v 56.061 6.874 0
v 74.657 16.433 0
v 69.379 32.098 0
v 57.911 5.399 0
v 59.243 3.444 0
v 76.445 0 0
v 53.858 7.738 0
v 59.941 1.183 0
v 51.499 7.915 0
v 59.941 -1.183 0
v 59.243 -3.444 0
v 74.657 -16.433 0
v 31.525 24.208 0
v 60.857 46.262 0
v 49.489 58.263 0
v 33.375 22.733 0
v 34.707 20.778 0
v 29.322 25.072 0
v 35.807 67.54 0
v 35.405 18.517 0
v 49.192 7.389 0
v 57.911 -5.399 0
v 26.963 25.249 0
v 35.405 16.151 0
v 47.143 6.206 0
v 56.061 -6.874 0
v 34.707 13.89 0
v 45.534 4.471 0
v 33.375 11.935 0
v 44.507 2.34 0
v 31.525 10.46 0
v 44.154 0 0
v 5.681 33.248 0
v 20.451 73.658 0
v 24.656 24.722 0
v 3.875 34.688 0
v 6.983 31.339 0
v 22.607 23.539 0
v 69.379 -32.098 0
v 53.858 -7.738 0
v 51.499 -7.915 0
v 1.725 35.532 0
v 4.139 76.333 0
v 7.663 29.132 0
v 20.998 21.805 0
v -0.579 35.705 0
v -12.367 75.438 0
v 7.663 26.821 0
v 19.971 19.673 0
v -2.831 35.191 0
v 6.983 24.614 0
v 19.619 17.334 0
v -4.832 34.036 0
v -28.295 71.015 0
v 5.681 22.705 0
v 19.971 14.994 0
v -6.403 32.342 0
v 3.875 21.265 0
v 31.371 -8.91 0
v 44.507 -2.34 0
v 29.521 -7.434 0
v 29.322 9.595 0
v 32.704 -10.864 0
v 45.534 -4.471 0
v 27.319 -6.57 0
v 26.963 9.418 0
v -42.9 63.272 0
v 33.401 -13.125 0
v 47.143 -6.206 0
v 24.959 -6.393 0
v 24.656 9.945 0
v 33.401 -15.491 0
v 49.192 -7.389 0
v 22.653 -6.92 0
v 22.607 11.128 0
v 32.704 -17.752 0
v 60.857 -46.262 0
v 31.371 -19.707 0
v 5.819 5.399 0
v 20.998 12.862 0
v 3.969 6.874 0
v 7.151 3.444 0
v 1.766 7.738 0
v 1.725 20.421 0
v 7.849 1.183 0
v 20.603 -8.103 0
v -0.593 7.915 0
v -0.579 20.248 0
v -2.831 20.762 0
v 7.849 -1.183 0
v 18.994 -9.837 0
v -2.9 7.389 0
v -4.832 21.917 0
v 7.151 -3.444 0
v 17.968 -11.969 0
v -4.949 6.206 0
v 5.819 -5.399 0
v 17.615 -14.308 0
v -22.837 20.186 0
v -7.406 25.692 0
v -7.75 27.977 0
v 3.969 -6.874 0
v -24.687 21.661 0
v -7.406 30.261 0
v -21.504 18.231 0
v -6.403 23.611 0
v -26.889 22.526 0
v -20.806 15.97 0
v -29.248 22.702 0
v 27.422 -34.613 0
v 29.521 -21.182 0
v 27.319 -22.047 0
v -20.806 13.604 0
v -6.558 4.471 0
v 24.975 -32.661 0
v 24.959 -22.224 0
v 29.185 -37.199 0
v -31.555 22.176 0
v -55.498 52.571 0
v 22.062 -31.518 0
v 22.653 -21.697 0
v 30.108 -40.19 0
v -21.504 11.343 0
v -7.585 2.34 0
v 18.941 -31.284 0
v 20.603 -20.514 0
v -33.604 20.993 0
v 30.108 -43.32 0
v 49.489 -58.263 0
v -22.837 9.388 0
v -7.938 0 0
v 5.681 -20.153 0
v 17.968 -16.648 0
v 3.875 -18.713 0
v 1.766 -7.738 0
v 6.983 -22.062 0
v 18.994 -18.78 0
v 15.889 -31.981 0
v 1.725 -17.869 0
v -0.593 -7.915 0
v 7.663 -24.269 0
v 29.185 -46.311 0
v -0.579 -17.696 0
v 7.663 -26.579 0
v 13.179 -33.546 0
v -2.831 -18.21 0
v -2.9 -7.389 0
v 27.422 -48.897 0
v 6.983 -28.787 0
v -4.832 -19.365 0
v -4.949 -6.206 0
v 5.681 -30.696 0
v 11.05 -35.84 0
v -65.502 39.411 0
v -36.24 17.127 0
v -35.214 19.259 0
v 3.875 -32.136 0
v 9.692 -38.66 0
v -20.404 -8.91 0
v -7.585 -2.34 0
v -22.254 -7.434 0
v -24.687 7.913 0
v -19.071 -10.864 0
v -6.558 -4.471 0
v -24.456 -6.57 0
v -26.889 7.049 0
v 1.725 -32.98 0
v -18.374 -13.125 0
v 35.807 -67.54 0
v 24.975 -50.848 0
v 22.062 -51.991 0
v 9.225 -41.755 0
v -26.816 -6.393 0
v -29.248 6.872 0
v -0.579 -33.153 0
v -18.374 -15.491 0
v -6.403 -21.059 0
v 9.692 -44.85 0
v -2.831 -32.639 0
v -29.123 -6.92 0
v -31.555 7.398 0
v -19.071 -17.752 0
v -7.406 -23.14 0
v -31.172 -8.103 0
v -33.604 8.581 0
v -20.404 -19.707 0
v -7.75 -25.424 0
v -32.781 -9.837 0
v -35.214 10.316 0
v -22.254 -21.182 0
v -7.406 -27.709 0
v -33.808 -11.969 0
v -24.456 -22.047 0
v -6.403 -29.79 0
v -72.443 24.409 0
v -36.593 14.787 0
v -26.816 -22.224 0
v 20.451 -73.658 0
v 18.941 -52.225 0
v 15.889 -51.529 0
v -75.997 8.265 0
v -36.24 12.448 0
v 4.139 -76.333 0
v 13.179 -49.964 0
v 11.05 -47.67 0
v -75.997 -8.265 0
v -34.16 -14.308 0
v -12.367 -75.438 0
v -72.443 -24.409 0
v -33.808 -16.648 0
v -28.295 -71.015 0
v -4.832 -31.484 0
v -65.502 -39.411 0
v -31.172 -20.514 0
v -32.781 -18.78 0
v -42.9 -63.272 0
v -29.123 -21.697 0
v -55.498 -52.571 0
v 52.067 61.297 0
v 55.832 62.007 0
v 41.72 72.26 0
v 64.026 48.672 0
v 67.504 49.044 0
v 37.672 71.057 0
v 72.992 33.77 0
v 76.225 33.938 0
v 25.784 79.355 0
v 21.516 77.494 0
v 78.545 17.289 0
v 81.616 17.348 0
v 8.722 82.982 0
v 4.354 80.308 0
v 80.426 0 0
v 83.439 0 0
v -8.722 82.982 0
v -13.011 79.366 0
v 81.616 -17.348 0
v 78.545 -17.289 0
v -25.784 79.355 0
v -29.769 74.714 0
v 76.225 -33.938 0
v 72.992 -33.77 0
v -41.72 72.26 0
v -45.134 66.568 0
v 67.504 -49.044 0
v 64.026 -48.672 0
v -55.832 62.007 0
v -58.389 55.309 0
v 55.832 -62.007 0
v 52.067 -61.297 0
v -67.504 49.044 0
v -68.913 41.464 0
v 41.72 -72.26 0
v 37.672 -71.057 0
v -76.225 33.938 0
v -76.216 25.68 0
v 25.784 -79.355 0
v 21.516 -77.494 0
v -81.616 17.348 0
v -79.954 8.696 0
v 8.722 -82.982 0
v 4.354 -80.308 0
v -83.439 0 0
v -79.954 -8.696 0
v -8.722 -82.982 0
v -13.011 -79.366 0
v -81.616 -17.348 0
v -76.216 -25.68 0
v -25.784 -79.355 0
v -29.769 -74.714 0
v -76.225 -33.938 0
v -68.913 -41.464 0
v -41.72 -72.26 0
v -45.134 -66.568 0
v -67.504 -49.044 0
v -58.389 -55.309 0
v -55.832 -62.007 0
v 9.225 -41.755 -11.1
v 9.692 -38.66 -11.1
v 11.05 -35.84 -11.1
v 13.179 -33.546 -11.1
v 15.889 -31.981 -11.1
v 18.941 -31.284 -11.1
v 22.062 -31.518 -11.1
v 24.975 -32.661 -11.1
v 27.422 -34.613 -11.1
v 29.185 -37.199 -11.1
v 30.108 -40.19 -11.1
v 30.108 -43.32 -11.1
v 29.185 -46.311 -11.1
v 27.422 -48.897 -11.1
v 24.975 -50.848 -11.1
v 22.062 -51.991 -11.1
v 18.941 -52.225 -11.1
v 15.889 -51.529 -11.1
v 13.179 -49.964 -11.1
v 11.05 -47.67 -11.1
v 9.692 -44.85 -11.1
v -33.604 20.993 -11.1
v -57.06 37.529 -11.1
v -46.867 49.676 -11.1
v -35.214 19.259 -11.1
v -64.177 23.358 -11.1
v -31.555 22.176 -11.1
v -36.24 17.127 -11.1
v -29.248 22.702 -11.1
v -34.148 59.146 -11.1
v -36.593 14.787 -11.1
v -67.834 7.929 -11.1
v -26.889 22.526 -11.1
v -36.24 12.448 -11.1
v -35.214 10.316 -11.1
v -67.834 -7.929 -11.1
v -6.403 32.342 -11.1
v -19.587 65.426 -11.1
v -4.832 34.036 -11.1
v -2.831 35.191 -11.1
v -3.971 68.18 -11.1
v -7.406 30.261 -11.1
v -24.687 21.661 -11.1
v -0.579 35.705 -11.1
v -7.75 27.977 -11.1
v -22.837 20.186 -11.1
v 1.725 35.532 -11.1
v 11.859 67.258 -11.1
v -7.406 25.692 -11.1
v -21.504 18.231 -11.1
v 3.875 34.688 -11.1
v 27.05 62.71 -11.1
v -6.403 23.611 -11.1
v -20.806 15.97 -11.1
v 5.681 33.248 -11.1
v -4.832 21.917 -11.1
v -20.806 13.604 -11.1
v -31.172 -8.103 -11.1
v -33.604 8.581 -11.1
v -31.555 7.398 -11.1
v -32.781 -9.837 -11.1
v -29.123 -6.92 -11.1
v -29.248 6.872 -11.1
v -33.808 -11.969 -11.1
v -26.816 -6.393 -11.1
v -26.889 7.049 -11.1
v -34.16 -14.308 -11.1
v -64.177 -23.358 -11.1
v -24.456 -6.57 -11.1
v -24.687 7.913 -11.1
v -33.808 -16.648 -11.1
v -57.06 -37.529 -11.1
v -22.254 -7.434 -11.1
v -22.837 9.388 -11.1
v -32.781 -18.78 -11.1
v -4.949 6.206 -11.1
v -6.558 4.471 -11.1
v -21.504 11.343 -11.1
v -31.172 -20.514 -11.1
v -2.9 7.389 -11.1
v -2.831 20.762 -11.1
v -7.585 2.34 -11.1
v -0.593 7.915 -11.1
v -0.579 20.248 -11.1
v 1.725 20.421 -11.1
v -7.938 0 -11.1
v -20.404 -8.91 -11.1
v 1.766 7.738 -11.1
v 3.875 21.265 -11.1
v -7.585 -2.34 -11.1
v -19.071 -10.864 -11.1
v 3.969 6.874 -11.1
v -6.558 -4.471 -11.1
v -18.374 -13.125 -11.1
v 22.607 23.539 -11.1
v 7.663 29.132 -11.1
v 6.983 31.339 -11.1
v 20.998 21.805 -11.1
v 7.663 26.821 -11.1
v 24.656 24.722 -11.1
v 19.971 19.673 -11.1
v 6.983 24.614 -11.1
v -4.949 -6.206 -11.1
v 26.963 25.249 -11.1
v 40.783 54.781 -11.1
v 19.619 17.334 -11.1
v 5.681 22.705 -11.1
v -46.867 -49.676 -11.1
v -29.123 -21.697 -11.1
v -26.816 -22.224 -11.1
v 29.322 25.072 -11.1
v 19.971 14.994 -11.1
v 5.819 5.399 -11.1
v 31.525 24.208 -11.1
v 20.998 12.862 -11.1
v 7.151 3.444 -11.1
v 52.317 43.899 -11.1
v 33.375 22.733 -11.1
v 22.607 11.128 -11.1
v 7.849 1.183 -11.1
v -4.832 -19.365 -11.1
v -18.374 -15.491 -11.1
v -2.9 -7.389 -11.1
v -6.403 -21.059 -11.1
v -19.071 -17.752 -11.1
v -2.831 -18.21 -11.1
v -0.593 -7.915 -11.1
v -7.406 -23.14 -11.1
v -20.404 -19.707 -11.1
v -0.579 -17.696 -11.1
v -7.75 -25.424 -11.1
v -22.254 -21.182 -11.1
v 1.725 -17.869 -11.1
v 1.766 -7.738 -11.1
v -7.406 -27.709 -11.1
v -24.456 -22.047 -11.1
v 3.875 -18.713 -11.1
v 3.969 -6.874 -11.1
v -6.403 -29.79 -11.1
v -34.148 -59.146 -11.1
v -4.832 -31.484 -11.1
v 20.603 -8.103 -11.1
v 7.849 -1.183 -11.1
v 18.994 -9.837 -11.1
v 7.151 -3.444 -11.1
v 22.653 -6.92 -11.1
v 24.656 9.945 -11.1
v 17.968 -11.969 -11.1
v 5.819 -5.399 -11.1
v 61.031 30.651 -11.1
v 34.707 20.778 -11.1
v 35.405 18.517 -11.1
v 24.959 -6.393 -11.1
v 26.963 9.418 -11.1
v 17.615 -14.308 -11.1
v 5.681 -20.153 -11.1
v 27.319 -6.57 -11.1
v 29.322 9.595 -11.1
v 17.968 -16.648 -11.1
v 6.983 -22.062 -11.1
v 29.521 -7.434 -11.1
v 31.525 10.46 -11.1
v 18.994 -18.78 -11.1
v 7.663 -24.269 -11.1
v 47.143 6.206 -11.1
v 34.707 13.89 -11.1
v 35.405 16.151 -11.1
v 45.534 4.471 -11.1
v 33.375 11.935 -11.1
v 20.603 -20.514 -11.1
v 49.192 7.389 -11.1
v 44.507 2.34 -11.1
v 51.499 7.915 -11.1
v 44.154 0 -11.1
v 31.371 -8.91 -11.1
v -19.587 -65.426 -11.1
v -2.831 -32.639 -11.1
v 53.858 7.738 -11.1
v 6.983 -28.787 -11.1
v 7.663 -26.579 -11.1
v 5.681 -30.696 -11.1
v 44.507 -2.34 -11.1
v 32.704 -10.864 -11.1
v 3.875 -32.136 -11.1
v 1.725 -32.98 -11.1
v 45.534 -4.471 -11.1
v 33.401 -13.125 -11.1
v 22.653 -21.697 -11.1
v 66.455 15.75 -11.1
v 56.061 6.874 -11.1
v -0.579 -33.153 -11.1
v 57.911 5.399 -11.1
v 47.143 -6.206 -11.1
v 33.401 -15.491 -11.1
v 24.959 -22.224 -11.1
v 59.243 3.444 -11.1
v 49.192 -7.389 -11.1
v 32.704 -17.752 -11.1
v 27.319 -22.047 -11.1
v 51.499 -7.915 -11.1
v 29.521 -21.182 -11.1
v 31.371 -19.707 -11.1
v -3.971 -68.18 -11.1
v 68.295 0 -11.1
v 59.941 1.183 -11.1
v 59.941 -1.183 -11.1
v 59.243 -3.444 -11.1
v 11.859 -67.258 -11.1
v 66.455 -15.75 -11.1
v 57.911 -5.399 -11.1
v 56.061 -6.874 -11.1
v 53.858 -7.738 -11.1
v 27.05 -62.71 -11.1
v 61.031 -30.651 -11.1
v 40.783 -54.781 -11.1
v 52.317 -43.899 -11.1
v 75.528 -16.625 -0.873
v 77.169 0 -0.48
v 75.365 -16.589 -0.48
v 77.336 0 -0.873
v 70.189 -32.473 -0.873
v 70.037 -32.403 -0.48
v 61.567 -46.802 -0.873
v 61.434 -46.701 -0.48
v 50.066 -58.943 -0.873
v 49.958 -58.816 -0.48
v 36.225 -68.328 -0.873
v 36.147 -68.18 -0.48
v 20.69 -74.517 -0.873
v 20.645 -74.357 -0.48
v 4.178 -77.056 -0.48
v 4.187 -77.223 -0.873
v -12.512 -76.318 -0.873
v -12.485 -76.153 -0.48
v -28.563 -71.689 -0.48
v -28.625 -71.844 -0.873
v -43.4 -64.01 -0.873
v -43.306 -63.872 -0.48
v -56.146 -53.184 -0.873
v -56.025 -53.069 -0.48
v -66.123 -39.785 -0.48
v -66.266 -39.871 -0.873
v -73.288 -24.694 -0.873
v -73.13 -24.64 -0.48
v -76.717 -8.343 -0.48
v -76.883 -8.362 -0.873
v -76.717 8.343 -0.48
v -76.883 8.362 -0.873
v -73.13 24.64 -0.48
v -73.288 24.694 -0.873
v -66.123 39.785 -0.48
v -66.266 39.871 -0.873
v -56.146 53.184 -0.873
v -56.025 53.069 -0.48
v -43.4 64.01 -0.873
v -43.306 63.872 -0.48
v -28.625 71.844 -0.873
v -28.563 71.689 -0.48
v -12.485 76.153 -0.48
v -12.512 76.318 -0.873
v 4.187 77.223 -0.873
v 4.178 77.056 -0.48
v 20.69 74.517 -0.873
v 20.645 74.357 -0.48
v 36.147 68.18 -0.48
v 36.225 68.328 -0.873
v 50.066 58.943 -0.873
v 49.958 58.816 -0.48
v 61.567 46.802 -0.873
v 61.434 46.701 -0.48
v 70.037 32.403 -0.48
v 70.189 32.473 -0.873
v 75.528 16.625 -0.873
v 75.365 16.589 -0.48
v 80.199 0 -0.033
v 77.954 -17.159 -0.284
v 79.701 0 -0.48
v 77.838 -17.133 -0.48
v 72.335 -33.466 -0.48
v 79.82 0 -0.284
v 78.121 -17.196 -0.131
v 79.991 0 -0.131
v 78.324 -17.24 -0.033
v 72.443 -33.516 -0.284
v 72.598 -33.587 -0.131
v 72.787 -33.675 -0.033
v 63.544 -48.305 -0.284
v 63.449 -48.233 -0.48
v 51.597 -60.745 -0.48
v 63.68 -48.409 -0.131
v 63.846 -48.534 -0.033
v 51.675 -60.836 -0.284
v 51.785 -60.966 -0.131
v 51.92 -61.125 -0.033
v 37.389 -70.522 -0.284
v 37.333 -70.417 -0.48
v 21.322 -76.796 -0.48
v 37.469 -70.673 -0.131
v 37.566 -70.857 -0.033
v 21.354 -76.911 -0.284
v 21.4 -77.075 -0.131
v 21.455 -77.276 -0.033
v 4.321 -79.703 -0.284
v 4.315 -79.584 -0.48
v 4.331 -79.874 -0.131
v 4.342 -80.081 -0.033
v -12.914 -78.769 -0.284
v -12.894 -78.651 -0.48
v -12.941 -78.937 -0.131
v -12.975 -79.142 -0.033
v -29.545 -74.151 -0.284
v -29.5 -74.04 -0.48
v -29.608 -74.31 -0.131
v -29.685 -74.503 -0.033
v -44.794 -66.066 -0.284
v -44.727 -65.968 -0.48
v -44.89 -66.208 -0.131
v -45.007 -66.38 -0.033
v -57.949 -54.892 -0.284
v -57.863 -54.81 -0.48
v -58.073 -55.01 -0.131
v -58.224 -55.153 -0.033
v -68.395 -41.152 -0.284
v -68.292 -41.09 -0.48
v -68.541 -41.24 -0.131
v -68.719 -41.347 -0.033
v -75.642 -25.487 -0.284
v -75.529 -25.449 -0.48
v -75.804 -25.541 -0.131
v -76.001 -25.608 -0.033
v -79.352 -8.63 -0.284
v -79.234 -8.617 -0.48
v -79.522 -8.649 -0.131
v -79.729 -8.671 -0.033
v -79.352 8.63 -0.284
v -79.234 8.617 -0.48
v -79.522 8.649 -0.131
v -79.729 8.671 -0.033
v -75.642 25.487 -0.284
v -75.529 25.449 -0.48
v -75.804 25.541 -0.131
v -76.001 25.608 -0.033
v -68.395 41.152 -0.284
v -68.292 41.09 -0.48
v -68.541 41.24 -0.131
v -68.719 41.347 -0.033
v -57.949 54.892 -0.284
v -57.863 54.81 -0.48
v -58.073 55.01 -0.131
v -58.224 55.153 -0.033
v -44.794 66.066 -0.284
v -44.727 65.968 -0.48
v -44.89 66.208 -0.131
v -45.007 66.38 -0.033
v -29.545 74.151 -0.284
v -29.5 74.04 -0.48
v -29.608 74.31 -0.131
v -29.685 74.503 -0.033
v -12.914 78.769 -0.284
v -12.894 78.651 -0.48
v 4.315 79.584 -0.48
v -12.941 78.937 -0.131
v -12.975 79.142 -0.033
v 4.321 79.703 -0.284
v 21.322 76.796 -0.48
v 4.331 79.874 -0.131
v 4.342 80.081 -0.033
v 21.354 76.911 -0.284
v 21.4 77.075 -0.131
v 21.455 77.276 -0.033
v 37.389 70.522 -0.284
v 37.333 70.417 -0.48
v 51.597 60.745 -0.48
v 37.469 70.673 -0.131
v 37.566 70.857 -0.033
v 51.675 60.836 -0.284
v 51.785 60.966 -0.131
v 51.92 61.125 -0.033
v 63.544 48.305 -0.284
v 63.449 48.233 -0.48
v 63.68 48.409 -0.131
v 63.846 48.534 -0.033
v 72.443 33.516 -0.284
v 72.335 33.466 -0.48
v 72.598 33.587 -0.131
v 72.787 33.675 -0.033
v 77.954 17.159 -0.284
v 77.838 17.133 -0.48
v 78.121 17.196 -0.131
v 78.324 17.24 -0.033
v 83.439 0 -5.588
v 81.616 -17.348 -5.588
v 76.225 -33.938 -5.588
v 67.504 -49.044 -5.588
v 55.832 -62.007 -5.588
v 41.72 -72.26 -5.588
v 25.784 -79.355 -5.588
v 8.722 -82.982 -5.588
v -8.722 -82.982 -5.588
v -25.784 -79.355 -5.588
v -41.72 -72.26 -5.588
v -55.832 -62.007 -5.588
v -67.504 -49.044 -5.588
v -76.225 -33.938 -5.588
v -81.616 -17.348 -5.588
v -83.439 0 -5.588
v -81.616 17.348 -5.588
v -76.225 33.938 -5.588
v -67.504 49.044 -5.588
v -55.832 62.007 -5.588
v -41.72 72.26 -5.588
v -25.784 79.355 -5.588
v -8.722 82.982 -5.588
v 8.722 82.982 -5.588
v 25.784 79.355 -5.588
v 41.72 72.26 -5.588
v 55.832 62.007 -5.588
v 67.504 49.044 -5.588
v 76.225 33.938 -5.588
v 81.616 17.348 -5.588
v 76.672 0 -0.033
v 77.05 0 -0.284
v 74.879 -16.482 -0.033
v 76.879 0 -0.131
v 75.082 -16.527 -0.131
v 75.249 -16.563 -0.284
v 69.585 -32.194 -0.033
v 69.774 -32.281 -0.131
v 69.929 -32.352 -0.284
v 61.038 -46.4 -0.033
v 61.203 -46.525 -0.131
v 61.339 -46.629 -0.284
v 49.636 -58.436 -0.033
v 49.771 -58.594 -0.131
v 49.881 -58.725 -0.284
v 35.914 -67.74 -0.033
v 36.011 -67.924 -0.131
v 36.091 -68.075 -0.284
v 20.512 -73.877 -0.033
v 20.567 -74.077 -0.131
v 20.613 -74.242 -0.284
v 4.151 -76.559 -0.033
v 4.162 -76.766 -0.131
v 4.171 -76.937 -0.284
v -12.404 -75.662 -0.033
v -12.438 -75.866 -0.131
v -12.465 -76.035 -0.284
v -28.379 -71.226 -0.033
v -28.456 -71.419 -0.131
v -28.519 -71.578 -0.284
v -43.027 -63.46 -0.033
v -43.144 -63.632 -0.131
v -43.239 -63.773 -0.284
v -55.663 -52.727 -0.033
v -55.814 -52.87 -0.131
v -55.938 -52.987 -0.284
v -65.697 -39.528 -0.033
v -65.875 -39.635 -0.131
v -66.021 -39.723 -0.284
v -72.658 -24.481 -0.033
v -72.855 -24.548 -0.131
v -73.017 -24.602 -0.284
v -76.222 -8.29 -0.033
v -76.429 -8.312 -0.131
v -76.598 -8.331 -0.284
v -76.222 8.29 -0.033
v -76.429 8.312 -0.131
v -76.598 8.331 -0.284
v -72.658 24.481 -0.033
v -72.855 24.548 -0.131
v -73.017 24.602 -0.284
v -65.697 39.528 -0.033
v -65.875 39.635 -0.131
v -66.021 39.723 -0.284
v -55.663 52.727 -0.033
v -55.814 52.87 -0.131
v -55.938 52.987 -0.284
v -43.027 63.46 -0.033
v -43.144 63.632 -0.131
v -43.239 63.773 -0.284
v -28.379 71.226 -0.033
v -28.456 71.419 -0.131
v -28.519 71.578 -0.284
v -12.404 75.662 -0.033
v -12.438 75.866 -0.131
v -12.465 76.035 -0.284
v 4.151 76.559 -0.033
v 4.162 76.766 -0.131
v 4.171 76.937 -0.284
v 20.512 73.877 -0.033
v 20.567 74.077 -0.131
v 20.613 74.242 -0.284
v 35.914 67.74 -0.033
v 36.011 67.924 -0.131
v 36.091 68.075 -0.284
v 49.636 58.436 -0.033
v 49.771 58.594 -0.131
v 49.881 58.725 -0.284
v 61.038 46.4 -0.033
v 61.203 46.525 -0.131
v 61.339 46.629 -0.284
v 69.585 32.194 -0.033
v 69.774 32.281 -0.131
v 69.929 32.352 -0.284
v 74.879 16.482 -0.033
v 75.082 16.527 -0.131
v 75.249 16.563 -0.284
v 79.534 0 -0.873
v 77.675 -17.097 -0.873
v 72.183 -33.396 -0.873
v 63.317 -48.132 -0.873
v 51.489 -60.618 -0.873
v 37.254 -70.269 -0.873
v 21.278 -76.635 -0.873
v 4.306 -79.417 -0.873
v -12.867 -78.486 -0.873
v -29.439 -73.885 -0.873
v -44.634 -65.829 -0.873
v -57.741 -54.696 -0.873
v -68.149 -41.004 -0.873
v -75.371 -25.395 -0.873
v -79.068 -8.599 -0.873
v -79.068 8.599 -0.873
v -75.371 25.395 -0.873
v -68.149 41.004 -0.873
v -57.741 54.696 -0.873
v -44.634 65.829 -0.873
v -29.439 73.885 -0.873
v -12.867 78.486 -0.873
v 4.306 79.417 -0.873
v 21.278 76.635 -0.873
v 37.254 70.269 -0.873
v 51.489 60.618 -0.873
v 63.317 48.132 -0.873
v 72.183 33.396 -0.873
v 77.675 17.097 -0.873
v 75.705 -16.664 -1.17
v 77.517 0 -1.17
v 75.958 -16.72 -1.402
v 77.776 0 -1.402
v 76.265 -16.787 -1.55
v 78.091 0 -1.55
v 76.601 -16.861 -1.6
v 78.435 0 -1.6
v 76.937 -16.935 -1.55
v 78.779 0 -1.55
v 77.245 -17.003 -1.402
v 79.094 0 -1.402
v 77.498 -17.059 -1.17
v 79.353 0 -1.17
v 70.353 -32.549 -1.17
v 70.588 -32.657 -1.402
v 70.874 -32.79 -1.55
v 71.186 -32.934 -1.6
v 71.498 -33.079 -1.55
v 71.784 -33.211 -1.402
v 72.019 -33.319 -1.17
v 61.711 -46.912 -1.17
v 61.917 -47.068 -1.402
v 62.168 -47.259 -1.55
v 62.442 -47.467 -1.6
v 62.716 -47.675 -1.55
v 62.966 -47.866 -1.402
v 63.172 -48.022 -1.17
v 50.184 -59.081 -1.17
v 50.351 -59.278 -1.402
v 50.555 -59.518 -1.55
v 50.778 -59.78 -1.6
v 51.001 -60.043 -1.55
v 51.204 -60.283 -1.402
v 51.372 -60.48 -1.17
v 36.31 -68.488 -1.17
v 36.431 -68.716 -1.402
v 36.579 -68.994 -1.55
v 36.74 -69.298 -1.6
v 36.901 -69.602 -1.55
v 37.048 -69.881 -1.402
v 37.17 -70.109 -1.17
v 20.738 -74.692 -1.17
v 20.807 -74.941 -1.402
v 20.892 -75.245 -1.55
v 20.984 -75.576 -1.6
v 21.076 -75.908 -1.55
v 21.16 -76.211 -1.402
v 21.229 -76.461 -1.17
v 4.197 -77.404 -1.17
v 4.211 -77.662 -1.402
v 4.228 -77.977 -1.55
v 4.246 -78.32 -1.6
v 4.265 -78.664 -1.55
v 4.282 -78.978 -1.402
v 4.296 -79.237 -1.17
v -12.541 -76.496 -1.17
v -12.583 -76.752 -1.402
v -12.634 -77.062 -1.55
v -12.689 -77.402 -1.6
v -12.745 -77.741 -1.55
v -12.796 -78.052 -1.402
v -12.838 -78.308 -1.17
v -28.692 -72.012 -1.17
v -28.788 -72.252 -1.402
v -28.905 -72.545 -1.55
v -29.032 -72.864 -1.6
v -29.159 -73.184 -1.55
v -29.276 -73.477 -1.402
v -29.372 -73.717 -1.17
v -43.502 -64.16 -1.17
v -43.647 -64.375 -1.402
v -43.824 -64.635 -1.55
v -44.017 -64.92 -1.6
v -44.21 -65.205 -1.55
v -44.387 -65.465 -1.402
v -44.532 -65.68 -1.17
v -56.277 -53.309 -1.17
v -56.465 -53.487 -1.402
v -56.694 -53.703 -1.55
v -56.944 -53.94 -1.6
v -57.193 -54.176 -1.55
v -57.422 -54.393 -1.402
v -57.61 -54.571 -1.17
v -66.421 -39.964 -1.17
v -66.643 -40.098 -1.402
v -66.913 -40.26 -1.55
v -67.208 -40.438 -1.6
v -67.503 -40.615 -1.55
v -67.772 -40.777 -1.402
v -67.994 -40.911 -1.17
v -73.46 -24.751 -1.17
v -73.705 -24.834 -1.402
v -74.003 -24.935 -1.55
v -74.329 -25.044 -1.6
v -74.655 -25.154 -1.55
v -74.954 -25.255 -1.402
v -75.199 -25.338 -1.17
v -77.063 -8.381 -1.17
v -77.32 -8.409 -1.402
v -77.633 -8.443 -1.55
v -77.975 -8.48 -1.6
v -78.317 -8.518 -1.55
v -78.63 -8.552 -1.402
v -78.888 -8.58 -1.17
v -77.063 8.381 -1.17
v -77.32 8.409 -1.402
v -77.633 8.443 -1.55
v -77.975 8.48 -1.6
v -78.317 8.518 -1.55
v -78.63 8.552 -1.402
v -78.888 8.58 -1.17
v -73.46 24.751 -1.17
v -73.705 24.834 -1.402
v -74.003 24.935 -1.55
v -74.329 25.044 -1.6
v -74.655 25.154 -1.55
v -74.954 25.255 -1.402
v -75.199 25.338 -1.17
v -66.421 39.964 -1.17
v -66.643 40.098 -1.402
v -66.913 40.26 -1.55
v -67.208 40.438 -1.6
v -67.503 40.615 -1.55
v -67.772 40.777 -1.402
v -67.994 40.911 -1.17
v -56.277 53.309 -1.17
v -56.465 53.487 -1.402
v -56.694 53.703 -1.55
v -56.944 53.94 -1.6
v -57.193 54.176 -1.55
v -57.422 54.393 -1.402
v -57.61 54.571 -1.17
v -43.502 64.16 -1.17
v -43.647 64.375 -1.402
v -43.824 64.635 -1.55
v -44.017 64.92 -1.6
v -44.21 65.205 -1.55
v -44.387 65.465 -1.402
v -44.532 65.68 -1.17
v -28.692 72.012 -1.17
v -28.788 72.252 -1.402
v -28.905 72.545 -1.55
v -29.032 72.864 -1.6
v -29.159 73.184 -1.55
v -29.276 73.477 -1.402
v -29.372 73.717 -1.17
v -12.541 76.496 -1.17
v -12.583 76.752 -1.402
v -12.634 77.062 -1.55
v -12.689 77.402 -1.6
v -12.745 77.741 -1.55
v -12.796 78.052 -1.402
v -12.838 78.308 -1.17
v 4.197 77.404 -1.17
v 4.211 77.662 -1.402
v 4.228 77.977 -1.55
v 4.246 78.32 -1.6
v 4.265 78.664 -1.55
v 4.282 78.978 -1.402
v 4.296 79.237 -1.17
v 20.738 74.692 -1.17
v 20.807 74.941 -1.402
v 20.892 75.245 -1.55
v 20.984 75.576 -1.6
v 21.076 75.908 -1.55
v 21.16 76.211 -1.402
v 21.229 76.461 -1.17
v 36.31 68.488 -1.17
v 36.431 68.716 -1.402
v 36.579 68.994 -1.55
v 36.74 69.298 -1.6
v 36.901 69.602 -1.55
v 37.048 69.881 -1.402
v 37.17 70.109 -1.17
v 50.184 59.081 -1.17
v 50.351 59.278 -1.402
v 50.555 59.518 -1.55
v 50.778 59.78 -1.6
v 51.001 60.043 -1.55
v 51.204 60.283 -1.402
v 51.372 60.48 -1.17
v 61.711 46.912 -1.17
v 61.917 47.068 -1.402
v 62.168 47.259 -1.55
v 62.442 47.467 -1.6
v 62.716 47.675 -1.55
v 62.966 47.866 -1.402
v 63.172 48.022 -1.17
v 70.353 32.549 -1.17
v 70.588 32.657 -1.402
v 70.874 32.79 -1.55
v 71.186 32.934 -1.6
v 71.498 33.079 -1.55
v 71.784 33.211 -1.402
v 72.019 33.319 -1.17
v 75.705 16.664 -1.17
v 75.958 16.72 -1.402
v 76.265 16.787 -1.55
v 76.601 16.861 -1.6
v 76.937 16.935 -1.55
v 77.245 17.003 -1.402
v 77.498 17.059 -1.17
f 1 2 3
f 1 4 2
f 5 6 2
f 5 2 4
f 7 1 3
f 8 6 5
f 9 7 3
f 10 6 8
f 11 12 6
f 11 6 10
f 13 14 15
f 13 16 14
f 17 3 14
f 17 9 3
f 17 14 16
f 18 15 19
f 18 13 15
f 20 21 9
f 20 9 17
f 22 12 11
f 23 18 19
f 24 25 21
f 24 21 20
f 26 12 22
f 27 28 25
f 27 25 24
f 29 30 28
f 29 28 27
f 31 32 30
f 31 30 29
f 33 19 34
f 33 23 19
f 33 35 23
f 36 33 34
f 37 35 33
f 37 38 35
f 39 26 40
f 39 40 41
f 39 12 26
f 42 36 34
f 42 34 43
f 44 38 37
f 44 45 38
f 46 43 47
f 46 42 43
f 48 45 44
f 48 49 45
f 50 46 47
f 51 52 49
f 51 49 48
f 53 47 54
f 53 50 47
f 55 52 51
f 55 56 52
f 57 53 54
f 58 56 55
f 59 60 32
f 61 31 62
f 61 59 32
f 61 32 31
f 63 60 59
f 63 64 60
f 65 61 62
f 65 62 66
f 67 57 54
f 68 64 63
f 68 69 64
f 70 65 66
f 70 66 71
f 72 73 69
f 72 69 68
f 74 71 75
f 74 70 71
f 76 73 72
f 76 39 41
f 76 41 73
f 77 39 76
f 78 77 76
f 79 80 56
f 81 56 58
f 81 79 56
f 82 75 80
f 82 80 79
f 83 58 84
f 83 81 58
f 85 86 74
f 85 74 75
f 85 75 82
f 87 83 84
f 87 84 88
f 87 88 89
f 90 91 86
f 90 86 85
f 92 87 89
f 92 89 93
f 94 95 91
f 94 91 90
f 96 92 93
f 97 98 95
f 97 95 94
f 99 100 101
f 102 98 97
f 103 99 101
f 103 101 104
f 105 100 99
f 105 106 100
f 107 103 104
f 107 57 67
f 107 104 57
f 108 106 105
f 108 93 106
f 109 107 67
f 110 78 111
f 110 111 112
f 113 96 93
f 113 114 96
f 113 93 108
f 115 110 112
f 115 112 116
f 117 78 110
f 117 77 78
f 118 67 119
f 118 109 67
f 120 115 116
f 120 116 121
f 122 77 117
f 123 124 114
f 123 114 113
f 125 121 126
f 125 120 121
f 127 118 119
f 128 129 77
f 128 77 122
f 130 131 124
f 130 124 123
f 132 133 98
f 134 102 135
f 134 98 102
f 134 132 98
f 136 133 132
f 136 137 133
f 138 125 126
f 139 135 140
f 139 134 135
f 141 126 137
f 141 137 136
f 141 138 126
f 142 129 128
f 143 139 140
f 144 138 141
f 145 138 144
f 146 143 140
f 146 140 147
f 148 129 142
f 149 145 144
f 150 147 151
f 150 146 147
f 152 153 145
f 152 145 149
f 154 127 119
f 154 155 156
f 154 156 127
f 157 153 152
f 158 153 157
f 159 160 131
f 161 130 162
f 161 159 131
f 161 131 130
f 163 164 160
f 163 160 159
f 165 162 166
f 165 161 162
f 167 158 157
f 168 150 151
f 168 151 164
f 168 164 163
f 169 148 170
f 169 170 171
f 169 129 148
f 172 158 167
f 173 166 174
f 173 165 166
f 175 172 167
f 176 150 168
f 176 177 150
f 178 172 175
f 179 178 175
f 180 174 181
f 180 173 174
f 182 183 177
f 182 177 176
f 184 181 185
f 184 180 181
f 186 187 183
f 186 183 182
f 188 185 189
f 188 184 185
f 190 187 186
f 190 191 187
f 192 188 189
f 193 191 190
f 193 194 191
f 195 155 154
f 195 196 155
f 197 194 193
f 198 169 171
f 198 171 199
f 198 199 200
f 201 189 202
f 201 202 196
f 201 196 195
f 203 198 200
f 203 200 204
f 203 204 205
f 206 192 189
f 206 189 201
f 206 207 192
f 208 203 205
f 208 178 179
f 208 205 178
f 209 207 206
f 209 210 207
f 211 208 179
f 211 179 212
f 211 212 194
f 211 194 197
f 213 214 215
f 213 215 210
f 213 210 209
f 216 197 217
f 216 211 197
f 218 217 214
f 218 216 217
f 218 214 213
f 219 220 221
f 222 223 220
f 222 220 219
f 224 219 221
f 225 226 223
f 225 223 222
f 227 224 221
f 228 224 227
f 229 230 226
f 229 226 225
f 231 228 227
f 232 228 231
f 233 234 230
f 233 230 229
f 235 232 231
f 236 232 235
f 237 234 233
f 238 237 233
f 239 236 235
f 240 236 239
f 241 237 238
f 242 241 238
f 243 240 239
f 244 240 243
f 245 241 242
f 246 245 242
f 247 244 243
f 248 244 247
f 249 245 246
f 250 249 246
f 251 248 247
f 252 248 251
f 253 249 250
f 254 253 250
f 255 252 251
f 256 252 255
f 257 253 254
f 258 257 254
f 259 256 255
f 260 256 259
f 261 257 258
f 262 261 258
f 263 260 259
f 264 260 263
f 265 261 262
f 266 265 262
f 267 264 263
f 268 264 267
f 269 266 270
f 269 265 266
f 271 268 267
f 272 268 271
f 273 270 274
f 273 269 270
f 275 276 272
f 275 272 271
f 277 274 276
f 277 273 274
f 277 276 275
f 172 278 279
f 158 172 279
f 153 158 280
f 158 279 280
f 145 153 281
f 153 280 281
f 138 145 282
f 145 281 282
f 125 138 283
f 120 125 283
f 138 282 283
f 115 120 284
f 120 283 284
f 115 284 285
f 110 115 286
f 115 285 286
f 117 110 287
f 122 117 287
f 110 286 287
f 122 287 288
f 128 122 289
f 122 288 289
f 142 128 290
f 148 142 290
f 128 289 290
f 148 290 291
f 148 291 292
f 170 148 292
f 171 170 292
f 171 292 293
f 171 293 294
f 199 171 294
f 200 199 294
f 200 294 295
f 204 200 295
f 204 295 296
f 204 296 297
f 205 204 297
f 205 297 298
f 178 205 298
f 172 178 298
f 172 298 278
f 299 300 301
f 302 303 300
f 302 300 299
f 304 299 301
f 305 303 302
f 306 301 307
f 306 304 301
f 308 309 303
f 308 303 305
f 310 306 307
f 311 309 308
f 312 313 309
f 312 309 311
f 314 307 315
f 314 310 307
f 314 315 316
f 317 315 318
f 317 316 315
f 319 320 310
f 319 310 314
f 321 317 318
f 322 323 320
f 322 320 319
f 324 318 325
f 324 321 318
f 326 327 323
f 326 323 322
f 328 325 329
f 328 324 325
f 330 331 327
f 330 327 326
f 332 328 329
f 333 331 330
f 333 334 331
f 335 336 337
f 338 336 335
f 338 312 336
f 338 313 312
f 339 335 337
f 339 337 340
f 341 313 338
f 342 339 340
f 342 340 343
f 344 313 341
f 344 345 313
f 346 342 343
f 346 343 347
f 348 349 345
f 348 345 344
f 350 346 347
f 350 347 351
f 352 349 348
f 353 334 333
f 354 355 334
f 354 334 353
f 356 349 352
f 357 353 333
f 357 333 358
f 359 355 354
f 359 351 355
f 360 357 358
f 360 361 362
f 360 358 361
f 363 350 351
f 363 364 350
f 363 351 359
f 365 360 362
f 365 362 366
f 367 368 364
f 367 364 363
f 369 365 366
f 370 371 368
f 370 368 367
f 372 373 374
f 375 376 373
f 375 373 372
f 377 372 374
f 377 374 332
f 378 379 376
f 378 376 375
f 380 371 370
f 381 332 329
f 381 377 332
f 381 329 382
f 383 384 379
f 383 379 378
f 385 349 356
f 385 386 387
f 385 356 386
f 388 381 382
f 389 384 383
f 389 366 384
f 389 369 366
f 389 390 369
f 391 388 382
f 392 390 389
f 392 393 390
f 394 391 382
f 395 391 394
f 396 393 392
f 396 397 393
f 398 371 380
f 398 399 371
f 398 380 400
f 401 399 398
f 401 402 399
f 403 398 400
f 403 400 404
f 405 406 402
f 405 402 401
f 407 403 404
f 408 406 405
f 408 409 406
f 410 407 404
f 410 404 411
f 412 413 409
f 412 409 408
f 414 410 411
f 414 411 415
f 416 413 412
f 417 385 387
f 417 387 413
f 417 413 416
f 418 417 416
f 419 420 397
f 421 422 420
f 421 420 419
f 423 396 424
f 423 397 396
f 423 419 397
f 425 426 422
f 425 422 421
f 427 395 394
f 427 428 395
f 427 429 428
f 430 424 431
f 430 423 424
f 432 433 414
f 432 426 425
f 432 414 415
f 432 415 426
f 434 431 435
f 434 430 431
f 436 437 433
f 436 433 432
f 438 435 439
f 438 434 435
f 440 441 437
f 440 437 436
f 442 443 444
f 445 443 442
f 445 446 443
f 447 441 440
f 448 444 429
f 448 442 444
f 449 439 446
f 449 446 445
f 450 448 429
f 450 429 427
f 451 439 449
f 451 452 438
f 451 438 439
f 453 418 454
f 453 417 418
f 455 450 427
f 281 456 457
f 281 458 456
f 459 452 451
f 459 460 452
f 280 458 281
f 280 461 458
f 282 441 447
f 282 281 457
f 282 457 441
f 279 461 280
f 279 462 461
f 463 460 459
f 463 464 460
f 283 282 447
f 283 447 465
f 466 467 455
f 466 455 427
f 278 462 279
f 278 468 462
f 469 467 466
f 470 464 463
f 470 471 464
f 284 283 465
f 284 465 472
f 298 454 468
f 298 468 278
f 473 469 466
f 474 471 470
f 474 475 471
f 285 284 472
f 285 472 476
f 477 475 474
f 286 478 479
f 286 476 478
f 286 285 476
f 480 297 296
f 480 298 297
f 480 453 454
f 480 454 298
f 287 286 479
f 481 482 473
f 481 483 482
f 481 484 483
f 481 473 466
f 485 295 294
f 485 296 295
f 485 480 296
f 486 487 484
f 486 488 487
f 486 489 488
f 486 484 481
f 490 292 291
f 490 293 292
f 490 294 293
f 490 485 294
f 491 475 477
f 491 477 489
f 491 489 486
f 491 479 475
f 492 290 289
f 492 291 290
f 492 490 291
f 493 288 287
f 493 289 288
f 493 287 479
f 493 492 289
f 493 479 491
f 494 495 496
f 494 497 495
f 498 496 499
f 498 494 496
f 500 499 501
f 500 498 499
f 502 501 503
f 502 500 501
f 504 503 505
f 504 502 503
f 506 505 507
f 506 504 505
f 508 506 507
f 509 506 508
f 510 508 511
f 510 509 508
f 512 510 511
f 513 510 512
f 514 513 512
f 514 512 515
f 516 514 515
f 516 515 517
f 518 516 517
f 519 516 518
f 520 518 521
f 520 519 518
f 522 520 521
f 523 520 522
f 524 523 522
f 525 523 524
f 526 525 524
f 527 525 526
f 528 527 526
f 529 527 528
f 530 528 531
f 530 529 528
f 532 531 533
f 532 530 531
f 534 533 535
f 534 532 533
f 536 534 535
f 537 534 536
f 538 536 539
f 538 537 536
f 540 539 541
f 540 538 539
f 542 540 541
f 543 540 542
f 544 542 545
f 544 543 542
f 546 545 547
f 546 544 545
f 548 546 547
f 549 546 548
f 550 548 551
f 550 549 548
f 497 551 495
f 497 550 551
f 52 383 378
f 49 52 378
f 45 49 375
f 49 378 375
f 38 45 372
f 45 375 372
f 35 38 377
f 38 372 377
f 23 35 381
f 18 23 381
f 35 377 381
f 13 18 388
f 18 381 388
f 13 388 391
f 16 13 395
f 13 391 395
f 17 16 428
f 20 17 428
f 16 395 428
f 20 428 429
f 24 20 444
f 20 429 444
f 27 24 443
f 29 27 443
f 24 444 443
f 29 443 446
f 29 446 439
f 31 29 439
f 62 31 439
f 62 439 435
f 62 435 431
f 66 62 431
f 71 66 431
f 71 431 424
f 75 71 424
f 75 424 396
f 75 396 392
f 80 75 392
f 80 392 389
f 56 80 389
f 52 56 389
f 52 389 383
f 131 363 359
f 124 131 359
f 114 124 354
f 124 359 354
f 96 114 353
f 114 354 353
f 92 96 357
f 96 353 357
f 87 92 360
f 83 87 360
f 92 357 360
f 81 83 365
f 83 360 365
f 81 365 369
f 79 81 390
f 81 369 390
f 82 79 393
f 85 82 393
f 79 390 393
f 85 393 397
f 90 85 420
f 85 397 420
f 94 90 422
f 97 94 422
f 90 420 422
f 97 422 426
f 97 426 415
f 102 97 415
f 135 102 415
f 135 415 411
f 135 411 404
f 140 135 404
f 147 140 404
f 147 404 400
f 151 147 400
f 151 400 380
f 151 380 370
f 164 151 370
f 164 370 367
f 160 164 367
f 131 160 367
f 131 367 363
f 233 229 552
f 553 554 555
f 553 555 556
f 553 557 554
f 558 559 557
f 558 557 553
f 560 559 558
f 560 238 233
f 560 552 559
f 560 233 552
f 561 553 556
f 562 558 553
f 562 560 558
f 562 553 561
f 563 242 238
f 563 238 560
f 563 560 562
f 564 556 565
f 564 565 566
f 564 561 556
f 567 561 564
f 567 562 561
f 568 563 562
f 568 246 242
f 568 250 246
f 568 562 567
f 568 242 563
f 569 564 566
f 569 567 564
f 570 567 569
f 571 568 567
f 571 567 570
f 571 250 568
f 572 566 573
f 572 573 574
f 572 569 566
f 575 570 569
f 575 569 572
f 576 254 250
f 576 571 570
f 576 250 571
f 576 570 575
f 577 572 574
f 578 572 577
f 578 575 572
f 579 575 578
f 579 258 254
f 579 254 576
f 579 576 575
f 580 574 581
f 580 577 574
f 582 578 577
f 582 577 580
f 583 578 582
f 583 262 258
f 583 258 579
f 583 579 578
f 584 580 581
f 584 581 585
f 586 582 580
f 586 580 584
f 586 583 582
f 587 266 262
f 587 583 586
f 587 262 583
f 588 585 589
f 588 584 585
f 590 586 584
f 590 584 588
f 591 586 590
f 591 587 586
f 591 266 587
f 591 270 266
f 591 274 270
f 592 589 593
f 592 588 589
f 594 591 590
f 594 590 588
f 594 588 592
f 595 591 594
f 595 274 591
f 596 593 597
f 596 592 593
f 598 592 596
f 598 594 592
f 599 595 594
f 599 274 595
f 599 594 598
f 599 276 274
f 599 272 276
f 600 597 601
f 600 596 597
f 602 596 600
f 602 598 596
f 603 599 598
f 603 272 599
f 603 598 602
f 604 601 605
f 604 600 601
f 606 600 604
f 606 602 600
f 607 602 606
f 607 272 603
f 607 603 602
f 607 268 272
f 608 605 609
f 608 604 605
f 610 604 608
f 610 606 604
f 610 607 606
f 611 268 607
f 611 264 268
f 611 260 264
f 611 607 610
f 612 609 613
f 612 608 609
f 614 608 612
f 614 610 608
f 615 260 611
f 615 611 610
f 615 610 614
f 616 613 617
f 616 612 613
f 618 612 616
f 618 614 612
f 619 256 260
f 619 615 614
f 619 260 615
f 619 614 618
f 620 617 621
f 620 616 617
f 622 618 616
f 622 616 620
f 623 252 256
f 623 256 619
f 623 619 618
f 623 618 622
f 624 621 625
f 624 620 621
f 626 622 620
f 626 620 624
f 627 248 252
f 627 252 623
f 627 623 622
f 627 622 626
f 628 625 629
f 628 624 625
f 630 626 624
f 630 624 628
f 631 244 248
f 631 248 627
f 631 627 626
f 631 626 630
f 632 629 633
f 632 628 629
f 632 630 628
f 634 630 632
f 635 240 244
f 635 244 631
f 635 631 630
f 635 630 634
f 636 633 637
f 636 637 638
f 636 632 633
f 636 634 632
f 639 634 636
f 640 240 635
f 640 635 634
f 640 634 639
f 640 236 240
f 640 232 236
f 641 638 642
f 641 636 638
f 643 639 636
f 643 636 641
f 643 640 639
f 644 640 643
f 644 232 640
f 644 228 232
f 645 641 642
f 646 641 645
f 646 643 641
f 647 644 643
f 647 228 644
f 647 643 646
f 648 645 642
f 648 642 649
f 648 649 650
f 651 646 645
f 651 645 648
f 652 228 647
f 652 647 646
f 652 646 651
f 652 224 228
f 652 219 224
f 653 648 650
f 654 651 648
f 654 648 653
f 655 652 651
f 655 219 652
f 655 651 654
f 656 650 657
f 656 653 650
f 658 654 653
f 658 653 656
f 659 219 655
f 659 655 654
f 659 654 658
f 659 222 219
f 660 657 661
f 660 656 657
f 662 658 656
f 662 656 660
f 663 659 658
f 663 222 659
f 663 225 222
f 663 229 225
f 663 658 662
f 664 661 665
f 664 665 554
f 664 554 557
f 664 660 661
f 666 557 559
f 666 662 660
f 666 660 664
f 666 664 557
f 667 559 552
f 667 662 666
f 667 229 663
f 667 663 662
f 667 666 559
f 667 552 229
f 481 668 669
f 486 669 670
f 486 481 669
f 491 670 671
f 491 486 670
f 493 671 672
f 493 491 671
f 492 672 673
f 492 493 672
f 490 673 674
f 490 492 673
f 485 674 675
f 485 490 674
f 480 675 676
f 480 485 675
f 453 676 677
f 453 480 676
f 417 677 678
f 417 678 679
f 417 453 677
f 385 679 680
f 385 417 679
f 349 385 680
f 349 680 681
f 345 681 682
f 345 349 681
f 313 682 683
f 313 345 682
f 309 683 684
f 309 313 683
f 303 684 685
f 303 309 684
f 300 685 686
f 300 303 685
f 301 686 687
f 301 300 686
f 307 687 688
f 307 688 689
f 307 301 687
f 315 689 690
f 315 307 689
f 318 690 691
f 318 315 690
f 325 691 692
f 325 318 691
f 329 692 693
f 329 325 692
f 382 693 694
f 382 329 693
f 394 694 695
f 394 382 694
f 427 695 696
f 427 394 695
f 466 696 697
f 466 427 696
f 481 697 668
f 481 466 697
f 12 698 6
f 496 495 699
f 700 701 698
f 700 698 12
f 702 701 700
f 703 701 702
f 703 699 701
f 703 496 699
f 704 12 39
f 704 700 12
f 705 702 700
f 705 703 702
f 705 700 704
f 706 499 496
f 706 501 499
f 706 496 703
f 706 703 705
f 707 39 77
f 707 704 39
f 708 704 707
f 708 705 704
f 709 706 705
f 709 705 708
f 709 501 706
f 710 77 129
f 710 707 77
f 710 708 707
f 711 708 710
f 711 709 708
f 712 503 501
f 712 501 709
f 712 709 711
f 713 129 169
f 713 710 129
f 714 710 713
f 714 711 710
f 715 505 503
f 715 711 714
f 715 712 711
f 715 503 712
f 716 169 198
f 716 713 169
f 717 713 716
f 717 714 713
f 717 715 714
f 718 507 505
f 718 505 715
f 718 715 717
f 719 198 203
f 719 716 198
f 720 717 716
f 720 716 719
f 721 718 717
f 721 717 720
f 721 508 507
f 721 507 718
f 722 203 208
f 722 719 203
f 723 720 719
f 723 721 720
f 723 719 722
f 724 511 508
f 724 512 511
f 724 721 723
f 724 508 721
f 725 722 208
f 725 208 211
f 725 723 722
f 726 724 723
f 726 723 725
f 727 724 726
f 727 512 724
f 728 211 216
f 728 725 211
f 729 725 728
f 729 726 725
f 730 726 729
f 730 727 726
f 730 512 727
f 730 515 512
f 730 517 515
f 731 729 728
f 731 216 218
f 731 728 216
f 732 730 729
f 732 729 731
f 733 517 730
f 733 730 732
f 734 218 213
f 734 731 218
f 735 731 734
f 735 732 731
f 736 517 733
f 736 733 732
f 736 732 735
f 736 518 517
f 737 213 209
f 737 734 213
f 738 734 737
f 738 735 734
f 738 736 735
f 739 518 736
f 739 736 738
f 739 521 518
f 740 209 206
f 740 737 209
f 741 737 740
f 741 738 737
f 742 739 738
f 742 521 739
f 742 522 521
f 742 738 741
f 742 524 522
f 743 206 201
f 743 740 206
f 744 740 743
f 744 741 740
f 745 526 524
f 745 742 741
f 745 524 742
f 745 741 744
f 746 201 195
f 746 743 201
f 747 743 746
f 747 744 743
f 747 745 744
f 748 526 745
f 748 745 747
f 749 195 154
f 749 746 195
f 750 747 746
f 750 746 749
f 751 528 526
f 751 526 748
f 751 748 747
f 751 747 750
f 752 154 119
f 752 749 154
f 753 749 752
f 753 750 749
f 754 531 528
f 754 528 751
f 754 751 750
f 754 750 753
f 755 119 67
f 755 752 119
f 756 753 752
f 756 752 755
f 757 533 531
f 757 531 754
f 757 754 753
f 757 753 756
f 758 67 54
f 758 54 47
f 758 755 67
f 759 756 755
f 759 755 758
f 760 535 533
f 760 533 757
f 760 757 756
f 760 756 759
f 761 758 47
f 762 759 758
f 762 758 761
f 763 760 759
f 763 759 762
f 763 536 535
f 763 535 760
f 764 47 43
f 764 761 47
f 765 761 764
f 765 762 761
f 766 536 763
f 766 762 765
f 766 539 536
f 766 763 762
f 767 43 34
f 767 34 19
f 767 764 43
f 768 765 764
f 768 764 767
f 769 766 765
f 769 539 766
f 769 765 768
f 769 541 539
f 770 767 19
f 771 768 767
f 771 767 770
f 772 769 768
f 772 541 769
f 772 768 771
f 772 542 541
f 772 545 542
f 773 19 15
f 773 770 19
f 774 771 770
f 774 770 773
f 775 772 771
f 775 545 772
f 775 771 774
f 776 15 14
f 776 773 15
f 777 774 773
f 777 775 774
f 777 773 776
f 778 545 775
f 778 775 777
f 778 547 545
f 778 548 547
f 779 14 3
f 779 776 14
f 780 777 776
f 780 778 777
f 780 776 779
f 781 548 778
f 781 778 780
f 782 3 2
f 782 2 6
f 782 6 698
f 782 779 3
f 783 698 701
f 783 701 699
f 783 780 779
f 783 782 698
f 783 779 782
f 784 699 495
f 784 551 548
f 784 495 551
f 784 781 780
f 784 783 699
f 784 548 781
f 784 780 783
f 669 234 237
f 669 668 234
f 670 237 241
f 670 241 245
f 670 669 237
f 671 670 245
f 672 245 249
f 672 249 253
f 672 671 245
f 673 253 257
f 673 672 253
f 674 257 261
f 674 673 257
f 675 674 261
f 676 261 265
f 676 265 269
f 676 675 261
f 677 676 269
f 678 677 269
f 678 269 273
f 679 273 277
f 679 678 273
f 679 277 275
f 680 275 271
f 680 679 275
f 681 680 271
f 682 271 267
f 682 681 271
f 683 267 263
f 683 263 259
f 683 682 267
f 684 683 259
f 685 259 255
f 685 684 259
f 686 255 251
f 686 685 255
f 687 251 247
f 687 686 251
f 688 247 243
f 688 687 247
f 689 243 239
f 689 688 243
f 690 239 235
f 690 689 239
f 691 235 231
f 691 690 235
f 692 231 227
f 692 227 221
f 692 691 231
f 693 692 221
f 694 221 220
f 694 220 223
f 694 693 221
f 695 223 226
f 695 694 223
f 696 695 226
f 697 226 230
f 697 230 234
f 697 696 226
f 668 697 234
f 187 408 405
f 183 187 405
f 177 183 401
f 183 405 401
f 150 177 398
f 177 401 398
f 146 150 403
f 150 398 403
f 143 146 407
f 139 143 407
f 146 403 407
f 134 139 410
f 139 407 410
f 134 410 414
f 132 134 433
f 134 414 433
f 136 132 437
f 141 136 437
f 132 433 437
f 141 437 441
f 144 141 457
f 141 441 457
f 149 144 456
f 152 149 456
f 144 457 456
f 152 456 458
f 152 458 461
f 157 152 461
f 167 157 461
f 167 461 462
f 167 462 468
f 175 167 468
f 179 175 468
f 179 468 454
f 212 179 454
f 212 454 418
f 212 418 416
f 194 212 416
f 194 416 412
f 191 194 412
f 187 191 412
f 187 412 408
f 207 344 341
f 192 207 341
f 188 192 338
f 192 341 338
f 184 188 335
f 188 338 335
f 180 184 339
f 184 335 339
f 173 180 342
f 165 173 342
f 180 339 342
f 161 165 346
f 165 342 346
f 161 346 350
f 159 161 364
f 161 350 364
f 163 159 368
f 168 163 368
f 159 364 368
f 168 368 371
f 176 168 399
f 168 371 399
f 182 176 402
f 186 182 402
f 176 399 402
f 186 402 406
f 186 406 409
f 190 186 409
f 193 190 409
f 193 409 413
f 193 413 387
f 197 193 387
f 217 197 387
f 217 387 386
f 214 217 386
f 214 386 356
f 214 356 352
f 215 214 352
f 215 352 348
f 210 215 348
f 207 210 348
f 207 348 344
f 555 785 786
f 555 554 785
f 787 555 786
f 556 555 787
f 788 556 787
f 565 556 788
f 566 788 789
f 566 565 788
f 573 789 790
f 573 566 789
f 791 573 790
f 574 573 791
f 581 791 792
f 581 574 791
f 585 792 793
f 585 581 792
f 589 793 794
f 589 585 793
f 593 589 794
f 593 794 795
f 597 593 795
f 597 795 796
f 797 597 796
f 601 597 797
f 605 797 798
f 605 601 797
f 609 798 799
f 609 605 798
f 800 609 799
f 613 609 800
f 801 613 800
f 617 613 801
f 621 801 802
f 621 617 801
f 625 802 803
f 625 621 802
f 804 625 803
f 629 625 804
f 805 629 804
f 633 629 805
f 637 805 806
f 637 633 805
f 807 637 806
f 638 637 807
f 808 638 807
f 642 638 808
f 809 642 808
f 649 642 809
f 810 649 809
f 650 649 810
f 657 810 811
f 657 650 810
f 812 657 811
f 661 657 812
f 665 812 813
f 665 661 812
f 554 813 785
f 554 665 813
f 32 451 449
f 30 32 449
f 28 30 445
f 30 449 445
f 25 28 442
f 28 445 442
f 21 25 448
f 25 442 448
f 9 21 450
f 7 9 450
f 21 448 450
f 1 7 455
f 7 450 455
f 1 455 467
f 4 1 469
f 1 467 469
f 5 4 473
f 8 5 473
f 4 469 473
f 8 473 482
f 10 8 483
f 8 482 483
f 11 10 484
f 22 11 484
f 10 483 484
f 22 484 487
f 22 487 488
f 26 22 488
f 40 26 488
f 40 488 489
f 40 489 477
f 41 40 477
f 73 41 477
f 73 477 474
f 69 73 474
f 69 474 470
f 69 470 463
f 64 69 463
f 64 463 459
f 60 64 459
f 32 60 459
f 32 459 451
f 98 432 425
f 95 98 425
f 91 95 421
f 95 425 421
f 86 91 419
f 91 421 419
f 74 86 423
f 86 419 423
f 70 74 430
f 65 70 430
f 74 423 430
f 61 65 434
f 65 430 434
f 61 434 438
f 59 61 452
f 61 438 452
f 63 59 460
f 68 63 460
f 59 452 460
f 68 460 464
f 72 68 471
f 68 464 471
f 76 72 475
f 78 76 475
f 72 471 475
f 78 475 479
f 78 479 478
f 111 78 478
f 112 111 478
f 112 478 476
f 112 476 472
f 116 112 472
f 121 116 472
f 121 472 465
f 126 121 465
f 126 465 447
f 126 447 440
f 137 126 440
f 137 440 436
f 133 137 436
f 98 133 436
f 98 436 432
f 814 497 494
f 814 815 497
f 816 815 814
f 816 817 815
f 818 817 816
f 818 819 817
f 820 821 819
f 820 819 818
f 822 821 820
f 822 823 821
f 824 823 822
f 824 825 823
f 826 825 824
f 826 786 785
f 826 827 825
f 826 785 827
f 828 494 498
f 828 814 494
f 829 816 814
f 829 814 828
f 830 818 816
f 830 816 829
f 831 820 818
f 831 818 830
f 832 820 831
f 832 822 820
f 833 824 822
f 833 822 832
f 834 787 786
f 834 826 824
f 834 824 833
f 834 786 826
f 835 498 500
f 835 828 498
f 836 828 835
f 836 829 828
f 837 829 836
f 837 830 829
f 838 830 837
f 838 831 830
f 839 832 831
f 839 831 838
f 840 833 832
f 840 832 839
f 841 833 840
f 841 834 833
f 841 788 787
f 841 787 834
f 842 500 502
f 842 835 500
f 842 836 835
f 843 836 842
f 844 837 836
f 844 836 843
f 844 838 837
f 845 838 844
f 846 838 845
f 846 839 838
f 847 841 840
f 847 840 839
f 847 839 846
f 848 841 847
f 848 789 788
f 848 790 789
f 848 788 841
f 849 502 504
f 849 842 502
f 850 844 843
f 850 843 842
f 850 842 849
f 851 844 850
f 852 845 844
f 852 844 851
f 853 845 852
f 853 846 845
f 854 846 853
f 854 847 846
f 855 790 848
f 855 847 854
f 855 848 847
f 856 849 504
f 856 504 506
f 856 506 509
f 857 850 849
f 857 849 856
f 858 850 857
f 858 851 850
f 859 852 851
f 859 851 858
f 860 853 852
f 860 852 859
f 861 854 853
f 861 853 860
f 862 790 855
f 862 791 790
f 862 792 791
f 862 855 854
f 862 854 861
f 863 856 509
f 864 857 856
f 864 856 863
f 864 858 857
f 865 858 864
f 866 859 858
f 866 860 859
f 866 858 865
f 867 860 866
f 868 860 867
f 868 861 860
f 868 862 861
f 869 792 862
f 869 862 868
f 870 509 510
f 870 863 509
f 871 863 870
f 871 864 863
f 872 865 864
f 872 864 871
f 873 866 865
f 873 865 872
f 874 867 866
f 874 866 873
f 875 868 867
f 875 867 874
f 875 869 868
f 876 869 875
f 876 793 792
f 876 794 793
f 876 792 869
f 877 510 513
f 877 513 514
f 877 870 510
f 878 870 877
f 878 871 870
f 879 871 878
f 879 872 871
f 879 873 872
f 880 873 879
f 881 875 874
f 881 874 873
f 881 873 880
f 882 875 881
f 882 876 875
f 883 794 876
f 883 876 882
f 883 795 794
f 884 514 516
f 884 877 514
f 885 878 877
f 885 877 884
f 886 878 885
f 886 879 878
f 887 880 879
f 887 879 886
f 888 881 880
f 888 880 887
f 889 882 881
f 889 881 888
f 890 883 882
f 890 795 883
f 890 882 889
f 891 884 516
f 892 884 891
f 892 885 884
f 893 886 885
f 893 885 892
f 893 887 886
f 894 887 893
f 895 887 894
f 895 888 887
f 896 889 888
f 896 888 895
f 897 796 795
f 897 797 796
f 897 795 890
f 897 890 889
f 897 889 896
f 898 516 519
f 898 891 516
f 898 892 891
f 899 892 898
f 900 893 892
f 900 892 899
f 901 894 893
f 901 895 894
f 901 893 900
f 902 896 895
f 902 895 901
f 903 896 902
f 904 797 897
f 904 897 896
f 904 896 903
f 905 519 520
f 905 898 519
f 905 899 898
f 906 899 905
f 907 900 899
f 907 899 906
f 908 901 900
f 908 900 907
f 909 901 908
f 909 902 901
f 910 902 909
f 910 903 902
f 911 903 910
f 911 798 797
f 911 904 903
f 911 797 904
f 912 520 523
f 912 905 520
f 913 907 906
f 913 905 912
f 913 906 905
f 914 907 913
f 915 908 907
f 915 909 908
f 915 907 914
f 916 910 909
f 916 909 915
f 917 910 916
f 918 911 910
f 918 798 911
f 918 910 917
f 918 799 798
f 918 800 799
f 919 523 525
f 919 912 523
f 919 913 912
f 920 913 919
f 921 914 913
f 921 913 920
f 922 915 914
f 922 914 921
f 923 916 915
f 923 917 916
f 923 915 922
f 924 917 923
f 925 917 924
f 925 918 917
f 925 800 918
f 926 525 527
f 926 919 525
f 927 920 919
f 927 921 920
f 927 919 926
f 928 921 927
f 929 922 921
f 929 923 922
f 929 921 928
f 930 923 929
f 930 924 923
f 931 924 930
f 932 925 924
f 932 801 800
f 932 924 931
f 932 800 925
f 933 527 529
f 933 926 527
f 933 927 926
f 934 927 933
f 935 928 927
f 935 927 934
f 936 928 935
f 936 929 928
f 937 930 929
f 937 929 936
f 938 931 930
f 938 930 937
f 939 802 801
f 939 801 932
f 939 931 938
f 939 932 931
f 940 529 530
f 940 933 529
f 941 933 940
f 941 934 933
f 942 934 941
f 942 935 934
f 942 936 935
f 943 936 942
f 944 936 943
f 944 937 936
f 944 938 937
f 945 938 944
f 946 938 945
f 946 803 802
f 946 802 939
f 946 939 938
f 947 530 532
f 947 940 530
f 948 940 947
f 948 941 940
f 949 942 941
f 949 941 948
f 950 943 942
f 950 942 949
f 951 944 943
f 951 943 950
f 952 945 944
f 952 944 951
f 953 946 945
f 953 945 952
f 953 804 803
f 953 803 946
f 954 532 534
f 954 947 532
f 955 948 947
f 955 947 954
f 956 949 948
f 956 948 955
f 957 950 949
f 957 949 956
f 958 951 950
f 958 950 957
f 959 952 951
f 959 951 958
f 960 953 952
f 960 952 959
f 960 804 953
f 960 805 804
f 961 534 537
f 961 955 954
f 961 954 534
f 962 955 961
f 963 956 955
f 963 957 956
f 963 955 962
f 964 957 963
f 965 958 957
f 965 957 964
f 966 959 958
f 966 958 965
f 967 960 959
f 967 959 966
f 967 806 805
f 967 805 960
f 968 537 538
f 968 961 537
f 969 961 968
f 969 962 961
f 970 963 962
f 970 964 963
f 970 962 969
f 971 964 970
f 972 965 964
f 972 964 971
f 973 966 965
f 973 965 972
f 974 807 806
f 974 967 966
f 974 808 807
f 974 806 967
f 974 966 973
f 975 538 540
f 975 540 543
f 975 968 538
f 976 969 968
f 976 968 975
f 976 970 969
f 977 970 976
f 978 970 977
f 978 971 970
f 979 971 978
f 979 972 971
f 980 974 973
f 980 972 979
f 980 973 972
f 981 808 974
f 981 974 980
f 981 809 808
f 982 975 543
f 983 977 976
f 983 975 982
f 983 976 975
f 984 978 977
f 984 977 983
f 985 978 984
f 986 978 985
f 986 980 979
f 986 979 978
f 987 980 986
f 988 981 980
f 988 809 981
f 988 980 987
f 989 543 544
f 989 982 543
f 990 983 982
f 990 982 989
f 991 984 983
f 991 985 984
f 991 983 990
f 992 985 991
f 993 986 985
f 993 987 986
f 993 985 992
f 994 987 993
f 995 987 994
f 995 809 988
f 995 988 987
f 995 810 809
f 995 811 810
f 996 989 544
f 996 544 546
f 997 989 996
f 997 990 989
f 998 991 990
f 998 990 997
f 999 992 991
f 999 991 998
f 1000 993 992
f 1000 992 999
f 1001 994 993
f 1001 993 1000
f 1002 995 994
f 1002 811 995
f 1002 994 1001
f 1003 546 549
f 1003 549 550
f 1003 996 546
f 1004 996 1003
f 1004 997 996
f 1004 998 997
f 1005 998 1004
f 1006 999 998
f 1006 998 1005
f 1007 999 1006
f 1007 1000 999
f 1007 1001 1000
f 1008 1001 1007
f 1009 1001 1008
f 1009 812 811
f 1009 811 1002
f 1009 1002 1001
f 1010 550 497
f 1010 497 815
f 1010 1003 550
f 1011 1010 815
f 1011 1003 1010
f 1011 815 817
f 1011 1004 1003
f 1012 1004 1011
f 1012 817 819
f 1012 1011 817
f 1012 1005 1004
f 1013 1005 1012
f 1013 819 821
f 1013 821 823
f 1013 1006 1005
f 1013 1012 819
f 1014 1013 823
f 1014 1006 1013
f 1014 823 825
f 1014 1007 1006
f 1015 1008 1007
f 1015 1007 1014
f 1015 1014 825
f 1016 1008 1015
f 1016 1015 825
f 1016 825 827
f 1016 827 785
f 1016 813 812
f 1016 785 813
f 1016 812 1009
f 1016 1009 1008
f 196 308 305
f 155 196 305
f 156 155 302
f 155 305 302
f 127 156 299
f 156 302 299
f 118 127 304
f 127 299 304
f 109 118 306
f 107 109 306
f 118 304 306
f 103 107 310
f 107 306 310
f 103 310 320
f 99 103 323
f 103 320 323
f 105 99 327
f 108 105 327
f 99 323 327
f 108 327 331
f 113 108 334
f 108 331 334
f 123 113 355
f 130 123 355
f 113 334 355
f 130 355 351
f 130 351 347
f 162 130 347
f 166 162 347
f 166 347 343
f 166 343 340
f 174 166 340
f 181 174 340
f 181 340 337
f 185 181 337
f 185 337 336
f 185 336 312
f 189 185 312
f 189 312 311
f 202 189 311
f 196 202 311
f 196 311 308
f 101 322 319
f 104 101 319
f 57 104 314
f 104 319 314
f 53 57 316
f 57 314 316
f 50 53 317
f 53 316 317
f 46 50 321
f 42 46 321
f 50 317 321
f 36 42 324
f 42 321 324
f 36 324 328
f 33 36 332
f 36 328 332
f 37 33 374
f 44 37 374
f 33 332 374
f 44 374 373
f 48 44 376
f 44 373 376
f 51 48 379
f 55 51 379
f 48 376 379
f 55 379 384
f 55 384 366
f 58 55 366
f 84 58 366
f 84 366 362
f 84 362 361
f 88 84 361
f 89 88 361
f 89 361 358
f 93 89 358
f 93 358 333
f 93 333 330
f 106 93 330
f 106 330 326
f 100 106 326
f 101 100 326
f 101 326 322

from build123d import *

# Parameters (mm, degrees)
SKETCH2_R          = 7.9375
SKETCH2_R_2        = 7.75
SKETCH2_R_3        = 10.5
CUT_EXTRUDE1_DEPTH = 119.521470637


with BuildPart() as part:
    # Sketch1 → Revolve1 (revolve)
    with BuildSketch(Plane(origin=(0, 0, 0), x_dir=(0, 0, -1), z_dir=(1, 0, 0)), mode=Mode.PRIVATE) as revolve1_sk:
        with BuildLine():
            Line((0, 0), (0, 76.444627725))
            ThreePointArc((0, 76.444627725), (0.130798304, 76.879222907), (0.479738309, 77.169433247))
            Line((0.479738309, 77.169433247), (0.872854821, 77.336301306))
            ThreePointArc((0.872854821, 77.336301306), (1.6002, 78.4352), (0.872854821, 79.534098694))
            Line((0.872854821, 79.534098694), (0.479738309, 79.700966753))
            ThreePointArc((0.479738309, 79.700966753), (0.130798304, 79.991177093), (0, 80.425772275))
            Line((0, 80.425772275), (0, 83.439))
            Line((0, 83.439), (5.588, 83.439))
            Line((5.588, 83.439), (11.0998, 68.295453959))
            Line((11.0998, 68.295453959), (11.0998, 0))
            Line((11.0998, 0), (0, 0))
        make_face()
    revolve(revolve1_sk.sketch.rotate(Axis((0, 0, 0), (0, 0, -1)), 90), axis=Axis((0, 0, 0), (0, 0, -1)))

    # Sketch2 → Cut-Extrude1 (cut, through all)
    with BuildSketch(Plane(origin=(0, 0, -11.0998), x_dir=(-1, 0, 0), z_dir=(0, 0, -1))):
        Circle(SKETCH2_R)
        with Locations((0, 27.9765569)):
            Circle(SKETCH2_R_2)
        with Locations((-25.552434697, -14.308394833)):
            Circle(SKETCH2_R)
        with Locations((-52.091958056, 0)):
            Circle(SKETCH2_R)
        with Locations((26.222693633, -14.308394833)):
            Circle(SKETCH2_R)
        with Locations((-27.556050936, 17.333644944)):
            Circle(SKETCH2_R)
        with Locations((28.655279996, 14.787165533)):
            Circle(SKETCH2_R)
        with Locations((0, -25.424326978)):
            Circle(SKETCH2_R_2)
        with Locations((-19.725243494, -41.754750634)):
            Circle(SKETCH2_R_3)
    extrude(amount=-CUT_EXTRUDE1_DEPTH, mode=Mode.SUBTRACT)


solid = part.part
